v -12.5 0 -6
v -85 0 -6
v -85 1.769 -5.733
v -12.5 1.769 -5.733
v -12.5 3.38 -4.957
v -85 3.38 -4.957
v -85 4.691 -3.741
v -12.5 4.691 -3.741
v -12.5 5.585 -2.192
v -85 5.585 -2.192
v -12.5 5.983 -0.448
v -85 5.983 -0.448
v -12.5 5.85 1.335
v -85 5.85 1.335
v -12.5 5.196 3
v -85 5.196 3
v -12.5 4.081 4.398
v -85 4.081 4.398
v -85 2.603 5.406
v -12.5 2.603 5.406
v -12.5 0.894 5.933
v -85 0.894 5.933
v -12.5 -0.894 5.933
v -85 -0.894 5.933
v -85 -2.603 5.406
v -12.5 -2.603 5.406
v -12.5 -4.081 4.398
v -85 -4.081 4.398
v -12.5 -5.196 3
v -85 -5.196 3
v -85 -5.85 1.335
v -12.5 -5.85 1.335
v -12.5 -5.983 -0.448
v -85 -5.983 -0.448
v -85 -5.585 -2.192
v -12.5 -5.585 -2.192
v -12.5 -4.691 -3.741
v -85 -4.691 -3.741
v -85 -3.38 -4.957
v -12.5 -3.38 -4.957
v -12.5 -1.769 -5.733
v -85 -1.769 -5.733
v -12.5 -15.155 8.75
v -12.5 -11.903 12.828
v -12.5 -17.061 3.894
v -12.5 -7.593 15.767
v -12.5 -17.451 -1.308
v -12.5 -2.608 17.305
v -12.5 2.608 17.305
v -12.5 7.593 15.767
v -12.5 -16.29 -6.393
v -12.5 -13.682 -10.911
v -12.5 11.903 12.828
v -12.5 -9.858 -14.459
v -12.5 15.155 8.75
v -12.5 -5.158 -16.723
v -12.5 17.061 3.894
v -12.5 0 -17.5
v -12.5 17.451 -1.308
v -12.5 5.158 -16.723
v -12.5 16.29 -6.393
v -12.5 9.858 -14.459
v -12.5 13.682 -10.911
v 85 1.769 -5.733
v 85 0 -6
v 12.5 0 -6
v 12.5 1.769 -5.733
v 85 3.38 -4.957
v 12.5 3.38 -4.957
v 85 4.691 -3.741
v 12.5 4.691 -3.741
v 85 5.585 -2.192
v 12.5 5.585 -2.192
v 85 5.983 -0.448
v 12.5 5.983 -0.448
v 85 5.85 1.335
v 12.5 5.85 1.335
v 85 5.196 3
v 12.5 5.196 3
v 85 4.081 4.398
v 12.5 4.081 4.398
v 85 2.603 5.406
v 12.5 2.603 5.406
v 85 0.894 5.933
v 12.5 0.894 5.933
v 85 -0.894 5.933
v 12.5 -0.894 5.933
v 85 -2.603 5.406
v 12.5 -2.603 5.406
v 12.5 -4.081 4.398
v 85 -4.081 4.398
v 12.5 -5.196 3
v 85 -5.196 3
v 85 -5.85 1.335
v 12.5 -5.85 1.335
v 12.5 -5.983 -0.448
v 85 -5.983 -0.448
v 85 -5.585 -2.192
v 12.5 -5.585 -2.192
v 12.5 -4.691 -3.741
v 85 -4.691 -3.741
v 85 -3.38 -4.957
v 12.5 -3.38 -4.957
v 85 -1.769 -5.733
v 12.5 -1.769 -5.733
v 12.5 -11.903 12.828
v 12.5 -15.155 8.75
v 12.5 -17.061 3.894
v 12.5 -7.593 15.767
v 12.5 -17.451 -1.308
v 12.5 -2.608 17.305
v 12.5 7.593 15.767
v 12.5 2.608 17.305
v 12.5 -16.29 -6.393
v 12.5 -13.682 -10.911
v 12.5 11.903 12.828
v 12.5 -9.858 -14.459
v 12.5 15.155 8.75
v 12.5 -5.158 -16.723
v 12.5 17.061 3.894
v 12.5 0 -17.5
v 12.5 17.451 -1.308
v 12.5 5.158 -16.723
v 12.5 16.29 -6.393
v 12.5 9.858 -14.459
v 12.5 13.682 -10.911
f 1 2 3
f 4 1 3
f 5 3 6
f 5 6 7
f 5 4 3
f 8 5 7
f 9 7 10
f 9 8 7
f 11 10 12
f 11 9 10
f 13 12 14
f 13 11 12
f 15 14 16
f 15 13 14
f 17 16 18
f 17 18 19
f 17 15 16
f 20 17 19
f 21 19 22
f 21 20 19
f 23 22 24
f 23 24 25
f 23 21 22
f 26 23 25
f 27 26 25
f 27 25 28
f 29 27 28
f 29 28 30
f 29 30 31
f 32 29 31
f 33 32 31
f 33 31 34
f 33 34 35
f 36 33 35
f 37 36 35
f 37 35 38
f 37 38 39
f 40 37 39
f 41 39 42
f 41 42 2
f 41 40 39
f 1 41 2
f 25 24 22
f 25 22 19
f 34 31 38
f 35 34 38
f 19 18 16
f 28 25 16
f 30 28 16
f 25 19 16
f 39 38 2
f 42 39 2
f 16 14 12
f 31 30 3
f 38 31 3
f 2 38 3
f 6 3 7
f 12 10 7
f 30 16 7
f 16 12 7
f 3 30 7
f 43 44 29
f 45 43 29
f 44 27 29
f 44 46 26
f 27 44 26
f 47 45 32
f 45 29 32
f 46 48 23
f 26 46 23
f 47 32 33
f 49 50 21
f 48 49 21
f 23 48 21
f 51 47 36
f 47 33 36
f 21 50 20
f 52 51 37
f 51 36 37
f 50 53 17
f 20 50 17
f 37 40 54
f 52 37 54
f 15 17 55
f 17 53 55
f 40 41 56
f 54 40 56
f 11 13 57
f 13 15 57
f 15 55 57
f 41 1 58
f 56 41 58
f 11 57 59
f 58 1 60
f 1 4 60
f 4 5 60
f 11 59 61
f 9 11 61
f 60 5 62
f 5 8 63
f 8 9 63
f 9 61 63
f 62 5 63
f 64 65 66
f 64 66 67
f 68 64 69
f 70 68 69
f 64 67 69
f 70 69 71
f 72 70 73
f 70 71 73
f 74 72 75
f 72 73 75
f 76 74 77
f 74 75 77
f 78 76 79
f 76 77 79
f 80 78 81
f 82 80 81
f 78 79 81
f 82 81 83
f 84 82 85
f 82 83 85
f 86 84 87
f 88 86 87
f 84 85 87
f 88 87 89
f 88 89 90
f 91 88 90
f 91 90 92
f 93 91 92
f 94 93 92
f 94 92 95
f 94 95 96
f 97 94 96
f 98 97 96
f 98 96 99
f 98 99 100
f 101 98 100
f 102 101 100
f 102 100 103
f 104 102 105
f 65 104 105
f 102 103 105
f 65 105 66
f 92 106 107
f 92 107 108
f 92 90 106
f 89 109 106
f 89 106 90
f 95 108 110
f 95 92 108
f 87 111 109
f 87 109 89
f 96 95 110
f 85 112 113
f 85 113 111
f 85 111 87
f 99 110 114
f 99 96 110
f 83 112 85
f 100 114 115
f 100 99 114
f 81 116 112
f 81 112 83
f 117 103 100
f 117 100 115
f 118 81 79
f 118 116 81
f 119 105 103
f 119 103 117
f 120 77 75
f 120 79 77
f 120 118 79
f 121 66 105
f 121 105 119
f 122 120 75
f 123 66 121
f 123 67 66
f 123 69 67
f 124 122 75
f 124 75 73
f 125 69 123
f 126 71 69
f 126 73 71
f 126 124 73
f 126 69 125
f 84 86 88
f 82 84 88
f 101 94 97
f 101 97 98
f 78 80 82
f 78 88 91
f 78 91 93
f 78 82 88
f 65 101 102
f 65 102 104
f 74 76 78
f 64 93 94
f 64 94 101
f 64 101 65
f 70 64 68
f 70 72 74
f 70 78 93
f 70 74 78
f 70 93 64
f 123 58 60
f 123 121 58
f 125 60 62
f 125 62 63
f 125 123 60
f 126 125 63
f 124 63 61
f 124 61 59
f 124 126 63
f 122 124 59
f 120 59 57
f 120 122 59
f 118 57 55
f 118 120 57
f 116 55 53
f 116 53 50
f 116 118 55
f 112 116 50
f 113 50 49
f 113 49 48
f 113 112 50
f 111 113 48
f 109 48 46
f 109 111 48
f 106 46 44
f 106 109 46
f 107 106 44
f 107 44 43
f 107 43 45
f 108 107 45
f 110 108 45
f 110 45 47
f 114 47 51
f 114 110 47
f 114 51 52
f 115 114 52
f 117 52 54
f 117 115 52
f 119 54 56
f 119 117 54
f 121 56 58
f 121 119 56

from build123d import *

# Parameters (mm, degrees)
CROQUIS1_R              = 17.5
SALIENTE_EXTRUIR1_DEPTH = 12.5
CROQUIS2_R              = 6
SALIENTE_EXTRUIR2_DEPTH = 72.5


with BuildPart() as part:
    # Croquis1 → Saliente-Extruir1 (new body, symmetric)
    with BuildSketch(Plane(origin=(0, 0, 0), x_dir=(0, 0, -1), z_dir=(1, 0, 0))):
        Circle(CROQUIS1_R)
    extrude(amount=SALIENTE_EXTRUIR1_DEPTH, both=True)

    # Croquis2 → Saliente-Extruir2 (add)
    with BuildSketch(Plane(origin=(12.5, 0, 0), x_dir=(0, 0, -1), z_dir=(1, 0, 0))):
        Circle(CROQUIS2_R)
    saliente_extruir2 = extrude(amount=SALIENTE_EXTRUIR2_DEPTH)

    # Simetría1: Saliente-Extruir2 across plane
    add(saliente_extruir2.mirror(Plane(origin=(0, 0, 0), x_dir=(0, 0, 1), z_dir=(1, 0, 0))))


solid = part.part
